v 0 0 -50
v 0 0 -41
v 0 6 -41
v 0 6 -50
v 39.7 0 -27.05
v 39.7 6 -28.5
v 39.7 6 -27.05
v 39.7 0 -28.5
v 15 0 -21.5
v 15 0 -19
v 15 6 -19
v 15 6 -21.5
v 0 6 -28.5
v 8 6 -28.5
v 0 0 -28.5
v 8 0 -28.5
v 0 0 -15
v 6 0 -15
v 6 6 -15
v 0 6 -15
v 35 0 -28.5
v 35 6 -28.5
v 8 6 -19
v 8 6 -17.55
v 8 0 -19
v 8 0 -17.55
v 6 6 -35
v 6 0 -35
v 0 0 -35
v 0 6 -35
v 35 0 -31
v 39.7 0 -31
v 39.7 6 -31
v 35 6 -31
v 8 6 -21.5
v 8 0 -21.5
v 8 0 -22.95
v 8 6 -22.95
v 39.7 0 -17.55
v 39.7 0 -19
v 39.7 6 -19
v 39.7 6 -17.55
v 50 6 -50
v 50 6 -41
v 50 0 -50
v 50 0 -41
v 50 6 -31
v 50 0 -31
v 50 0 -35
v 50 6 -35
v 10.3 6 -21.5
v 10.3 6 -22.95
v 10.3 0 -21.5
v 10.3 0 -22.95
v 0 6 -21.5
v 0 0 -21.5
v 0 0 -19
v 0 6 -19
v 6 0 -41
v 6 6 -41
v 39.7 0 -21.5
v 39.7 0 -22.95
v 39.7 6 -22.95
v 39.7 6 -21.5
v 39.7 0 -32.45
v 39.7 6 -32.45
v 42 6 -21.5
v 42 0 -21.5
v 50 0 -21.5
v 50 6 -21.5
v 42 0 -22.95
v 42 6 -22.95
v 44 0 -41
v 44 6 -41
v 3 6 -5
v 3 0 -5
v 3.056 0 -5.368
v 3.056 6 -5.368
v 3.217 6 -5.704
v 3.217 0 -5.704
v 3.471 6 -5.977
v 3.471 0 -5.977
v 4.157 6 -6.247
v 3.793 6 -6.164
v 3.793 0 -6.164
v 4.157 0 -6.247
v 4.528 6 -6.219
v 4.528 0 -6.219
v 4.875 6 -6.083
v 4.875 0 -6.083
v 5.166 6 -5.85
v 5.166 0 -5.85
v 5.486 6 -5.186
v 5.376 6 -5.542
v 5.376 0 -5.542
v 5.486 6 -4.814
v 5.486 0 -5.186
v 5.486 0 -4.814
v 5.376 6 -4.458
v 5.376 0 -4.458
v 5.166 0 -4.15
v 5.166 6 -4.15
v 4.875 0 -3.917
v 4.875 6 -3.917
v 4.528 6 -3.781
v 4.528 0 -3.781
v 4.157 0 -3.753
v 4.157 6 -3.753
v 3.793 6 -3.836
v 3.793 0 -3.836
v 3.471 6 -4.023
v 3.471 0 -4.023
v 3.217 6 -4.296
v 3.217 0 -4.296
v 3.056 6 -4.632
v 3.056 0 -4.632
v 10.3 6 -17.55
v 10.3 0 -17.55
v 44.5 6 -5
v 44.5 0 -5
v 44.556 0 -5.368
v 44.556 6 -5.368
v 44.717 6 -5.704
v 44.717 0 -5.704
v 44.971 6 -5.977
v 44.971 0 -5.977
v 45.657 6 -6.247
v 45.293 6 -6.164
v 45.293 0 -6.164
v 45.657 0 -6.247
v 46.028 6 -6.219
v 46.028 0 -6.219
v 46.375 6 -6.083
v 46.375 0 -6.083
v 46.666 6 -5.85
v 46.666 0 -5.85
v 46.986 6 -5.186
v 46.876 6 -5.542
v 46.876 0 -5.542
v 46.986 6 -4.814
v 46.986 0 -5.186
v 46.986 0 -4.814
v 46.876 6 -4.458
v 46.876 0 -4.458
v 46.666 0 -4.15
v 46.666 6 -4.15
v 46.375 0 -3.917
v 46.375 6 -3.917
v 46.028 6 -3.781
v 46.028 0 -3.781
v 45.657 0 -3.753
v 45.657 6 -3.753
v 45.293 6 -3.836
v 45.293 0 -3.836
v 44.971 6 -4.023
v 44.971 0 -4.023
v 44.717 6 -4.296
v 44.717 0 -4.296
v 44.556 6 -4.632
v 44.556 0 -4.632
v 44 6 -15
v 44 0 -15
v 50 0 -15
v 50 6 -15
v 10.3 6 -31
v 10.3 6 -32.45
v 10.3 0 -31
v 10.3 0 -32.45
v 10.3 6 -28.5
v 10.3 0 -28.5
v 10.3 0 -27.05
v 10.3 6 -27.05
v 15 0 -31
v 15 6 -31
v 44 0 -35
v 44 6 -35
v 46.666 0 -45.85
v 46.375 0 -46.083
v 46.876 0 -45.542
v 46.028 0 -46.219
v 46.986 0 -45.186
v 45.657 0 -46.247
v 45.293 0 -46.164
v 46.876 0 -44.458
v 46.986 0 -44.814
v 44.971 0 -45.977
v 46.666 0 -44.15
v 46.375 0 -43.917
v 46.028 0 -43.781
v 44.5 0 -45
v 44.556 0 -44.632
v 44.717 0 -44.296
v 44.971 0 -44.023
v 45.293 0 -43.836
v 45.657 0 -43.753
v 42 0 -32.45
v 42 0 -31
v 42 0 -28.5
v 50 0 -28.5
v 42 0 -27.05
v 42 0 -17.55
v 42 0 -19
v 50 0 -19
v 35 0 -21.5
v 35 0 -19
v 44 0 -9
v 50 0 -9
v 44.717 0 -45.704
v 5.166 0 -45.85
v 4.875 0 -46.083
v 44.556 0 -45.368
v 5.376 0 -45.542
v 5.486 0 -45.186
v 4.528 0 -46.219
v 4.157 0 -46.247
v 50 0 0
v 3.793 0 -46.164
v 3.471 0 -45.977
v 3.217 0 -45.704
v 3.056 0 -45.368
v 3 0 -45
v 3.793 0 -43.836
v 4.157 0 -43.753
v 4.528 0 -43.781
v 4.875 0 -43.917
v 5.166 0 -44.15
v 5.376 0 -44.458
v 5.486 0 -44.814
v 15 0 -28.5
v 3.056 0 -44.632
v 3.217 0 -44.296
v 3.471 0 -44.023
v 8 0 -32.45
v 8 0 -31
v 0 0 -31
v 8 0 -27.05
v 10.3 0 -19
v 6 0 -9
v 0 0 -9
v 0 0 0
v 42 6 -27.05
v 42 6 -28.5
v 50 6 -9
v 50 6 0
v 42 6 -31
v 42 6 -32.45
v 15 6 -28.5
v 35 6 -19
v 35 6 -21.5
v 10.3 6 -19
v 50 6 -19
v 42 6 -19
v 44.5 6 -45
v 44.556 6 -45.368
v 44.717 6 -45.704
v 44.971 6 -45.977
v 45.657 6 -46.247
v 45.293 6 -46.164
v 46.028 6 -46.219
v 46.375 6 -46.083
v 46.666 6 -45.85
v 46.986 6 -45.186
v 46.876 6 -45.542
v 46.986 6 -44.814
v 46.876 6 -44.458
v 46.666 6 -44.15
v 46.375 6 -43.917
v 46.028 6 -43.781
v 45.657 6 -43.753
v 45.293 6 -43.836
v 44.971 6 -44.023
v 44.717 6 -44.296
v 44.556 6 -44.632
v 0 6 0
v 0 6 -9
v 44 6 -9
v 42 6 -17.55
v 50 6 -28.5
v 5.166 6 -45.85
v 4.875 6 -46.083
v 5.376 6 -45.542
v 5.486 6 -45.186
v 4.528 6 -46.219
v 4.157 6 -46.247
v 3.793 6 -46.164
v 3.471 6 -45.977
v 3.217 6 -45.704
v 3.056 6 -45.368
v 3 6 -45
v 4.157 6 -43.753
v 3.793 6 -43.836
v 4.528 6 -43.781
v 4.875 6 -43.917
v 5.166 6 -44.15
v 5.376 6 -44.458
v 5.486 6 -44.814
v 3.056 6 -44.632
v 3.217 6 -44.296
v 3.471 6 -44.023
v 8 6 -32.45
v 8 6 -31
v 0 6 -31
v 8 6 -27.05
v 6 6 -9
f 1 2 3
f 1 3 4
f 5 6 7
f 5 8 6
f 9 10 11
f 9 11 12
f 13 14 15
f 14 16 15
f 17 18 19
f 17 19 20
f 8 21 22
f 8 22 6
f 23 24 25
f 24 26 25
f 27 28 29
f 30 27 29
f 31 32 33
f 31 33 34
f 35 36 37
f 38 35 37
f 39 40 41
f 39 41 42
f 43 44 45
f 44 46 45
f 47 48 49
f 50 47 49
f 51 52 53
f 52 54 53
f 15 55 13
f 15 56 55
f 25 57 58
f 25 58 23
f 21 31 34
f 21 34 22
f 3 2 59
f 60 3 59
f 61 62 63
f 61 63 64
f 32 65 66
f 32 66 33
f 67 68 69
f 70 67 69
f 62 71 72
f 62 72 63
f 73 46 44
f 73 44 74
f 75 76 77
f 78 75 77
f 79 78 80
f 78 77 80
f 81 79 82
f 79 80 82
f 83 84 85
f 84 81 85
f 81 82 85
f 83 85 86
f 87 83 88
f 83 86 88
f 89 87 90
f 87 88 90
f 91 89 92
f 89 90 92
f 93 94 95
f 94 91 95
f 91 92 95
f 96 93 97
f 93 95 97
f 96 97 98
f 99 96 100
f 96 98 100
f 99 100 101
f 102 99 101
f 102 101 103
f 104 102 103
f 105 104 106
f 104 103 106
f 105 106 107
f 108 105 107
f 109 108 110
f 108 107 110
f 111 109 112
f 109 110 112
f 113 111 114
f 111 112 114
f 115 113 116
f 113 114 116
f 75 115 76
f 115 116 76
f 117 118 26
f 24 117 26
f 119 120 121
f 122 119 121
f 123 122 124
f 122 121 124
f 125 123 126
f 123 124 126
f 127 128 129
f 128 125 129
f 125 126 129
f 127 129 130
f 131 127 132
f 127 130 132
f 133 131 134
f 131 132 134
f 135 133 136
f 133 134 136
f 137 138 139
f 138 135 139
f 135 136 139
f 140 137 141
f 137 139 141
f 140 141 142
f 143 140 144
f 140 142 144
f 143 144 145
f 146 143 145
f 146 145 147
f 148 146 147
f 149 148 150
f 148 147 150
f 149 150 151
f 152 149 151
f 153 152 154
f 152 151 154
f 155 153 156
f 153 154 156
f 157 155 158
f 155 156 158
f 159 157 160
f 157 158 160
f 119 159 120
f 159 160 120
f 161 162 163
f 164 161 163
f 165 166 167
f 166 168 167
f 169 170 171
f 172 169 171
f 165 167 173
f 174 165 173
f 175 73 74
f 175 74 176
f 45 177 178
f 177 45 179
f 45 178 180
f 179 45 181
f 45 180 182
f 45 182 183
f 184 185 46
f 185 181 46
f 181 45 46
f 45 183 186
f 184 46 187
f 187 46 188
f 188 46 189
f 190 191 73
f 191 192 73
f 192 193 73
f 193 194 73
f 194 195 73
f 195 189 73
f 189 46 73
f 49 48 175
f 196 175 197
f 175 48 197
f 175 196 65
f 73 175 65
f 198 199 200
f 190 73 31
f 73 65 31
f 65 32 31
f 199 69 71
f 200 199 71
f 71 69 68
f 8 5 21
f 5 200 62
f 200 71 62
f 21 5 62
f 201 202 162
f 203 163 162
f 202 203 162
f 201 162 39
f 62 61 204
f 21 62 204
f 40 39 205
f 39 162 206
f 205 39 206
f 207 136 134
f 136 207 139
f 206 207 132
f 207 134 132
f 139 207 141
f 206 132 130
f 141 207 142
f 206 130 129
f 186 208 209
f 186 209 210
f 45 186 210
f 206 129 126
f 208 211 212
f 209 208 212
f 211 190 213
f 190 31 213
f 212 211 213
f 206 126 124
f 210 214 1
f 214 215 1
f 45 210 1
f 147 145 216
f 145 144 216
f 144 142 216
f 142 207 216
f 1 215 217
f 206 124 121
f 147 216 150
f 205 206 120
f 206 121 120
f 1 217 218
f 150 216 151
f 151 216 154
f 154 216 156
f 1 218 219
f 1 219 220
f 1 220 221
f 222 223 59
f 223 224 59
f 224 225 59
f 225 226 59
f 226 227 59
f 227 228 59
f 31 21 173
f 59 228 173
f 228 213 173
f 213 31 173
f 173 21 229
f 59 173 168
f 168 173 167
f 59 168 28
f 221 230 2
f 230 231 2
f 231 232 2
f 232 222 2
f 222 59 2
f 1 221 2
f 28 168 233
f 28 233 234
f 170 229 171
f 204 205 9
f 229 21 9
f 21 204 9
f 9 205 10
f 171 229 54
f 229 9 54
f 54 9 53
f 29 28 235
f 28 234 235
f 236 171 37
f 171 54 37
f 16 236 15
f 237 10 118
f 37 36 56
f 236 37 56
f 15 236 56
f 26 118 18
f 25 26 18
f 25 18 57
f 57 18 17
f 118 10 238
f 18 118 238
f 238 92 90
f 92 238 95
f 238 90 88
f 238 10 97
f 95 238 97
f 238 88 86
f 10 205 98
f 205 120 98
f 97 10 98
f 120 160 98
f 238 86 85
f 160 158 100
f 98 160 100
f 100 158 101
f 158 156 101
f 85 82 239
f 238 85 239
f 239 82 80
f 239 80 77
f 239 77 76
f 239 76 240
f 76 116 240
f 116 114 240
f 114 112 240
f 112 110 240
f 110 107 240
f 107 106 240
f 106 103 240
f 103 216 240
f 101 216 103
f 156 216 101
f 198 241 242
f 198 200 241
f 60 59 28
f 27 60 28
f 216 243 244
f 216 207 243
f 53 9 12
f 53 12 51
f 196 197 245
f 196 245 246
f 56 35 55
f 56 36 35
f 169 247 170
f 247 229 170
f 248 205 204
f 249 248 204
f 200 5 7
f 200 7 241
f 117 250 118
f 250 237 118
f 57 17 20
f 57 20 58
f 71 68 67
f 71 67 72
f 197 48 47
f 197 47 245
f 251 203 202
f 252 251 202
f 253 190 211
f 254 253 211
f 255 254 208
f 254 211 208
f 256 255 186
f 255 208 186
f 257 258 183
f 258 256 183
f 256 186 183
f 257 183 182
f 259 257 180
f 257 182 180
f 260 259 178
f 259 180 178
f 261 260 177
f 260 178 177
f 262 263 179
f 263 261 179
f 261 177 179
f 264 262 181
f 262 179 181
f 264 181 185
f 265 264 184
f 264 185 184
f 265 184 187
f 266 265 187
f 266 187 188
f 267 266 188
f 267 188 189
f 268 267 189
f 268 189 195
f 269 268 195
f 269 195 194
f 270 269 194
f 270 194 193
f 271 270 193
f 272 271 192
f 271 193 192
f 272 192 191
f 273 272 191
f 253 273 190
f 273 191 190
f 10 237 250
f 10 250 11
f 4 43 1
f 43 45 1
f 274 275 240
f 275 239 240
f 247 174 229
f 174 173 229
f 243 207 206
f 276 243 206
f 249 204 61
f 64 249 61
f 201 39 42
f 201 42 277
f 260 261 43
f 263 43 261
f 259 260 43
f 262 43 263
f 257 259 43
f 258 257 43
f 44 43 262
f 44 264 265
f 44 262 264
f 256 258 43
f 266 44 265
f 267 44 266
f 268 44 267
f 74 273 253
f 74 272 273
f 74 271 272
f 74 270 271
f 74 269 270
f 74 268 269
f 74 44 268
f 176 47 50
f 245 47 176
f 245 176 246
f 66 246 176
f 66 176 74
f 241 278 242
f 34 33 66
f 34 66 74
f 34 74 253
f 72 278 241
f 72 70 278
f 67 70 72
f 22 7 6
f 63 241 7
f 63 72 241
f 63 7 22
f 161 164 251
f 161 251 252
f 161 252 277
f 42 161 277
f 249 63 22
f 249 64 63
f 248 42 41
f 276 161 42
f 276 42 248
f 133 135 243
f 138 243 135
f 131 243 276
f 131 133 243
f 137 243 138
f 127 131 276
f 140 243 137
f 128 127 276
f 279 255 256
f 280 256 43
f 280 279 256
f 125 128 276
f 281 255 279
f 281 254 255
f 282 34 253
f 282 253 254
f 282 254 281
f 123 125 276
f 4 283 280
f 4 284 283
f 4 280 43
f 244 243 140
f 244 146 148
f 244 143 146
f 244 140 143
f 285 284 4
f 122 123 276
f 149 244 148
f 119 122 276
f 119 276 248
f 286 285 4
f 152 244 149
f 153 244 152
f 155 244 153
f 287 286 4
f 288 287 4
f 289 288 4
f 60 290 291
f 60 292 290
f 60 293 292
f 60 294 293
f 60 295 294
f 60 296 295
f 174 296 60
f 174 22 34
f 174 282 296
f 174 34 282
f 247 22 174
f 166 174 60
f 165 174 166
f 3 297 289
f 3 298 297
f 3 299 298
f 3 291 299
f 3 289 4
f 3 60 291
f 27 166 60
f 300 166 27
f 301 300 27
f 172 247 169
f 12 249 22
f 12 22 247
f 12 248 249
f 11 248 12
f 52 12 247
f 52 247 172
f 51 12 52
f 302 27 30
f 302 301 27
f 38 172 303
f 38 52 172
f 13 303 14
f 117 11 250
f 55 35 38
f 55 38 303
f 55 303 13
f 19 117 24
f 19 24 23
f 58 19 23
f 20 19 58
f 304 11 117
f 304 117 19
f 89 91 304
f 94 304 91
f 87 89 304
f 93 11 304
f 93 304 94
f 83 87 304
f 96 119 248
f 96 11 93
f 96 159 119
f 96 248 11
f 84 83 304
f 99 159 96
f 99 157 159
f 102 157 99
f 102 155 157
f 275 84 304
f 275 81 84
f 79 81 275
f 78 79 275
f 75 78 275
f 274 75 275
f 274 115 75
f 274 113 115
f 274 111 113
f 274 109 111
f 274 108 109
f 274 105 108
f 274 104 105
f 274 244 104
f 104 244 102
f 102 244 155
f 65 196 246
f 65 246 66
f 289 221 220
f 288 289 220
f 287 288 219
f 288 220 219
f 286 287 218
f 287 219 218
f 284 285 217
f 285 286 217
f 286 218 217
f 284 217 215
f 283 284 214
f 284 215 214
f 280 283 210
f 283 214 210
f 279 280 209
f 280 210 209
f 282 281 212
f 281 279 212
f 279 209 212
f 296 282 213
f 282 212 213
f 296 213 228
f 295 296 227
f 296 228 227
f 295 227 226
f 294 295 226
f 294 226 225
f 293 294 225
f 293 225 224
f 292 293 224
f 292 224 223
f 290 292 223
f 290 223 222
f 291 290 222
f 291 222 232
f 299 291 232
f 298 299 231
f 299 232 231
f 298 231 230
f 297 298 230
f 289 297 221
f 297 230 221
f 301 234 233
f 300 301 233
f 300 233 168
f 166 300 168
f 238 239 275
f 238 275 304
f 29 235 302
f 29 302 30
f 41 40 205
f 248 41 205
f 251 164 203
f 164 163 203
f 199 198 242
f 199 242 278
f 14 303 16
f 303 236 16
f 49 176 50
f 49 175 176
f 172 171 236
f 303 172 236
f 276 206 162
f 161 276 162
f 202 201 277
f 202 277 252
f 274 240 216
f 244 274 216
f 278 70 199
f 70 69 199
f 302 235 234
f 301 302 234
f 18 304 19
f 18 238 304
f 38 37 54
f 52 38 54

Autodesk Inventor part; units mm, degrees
ref_plane "YZ Plane" through (0, 0, 0) normal (1, 0, 0) x (0, 1, 0)
ref_plane "XZ Plane" through (0, 0, 0) normal (0, 1, 0) x (-1, 0, 0)
ref_plane "XY Plane" through (0, 0, 0) normal (0, 0, 1) x (1, 0, 0)
sketch "Sketch1" plane through (0, 0, 0) normal (0, 1, 0) x (-1, 0, 0)
  line L0 (0, 0) -> (-50, 0)
  line L1 (-50, -50) -> (0, -50)
  line L2 (-50, -41) -> (-44, -41)
  line L3 (-44, -41) -> (-44, -35)
  line L4 (-44, -35) -> (-50, -35)
  line L5 (-50, -35) -> (-50, -41) construction
  line L6 (-50, -9) -> (-44, -9)
  line L7 (-44, -9) -> (-44, -15)
  line L8 (-44, -15) -> (-50, -15)
  line L9 (-50, -15) -> (-50, -9) construction
  line L10 (-25, 0) -> (-25, -50) construction
  line L11 (-50, -9) -> (-50, 0)
  line L12 (-50, -15) -> (-50, -19)
  line L13 (-50, -41) -> (-50, -50)
  circle A0 centre (-45.75, -5) radius 1.25
  circle A1 centre (-45.75, -45) radius 1.25
  line L14 (-50, -31) -> (-42, -31)
  line L15 (-35, -31) -> (-35, -28.5)
  line L16 (-35, -28.5) -> (-39.7, -28.5)
  line L17 (-50, -19) -> (-42, -19)
  line L18 (-35, -19) -> (-35, -21.5)
  line L19 (-35, -21.5) -> (-39.7, -21.5)
  line L20 (-50, -31) -> (-50, -35)
  line L21 (-50, -28.5) -> (-50, -31) construction
  line L22 (-50, -21.5) -> (-50, -28.5)
  line L23 (-50, -19) -> (-50, -21.5) construction
  line L24 (-42, -32.45) -> (-39.7, -32.45)
  line L25 (-39.7, -32.45) -> (-39.7, -31)
  line L26 (-39.7, -27.05) -> (-42, -27.05)
  line L27 (-42, -27.05) -> (-42, -28.5)
  line L28 (-42, -31) -> (-42, -32.45)
  line L29 (-42, -28.5) -> (-42, -31) construction
  line L30 (-42, -22.95) -> (-39.7, -22.95)
  line L31 (-39.7, -22.95) -> (-39.7, -21.5)
  line L32 (-39.7, -17.55) -> (-42, -17.55)
  line L33 (-42, -17.55) -> (-42, -19)
  line L34 (-42, -21.5) -> (-42, -22.95)
  line L35 (-42, -19) -> (-42, -21.5) construction
  line L36 (-39.7, -28.5) -> (-39.7, -27.05)
  line L37 (-39.7, -31) -> (-39.7, -28.5) construction
  line L38 (-39.7, -21.5) -> (-39.7, -19) construction
  line L39 (-39.7, -19) -> (-39.7, -17.55)
  line L40 (-42, -31) -> (-39.7, -31) construction
  line L41 (-39.7, -31) -> (-35, -31)
  line L42 (-42, -28.5) -> (-50, -28.5)
  line L43 (-39.7, -28.5) -> (-42, -28.5) construction
  line L44 (-42, -21.5) -> (-50, -21.5)
  line L45 (-39.7, -21.5) -> (-42, -21.5) construction
  line L46 (-42, -19) -> (-39.7, -19) construction
  line L47 (-39.7, -19) -> (-35, -19)
  line L48 (0, -41) -> (-6, -41)
  line L49 (-6, -41) -> (-6, -35)
  line L50 (-6, -35) -> (0, -35)
  line L51 (0, -35) -> (0, -41) construction
  line L52 (0, -9) -> (-6, -9)
  line L53 (-6, -9) -> (-6, -15)
  line L54 (-6, -15) -> (0, -15)
  line L55 (0, -15) -> (0, -9) construction
  line L56 (0, -9) -> (0, 0)
  line L57 (0, -15) -> (0, -19)
  line L58 (0, -41) -> (0, -50)
  circle A2 centre (-4.25, -5) radius 1.25
  circle A3 centre (-4.25, -45) radius 1.25
  line L59 (0, -31) -> (-8, -31)
  line L60 (-15, -31) -> (-15, -28.5)
  line L61 (-15, -28.5) -> (-10.3, -28.5)
  line L62 (0, -19) -> (-8, -19)
  line L63 (-15, -19) -> (-15, -21.5)
  line L64 (-15, -21.5) -> (-10.3, -21.5)
  line L65 (0, -31) -> (0, -35)
  line L66 (0, -28.5) -> (0, -31) construction
  line L67 (0, -21.5) -> (0, -28.5)
  line L68 (0, -19) -> (0, -21.5) construction
  line L69 (-8, -32.45) -> (-10.3, -32.45)
  line L70 (-10.3, -32.45) -> (-10.3, -31)
  line L71 (-10.3, -27.05) -> (-8, -27.05)
  line L72 (-8, -27.05) -> (-8, -28.5)
  line L73 (-8, -31) -> (-8, -32.45)
  line L74 (-8, -28.5) -> (-8, -31) construction
  line L75 (-8, -22.95) -> (-10.3, -22.95)
  line L76 (-10.3, -22.95) -> (-10.3, -21.5)
  line L77 (-10.3, -17.55) -> (-8, -17.55)
  line L78 (-8, -17.55) -> (-8, -19)
  line L79 (-8, -21.5) -> (-8, -22.95)
  line L80 (-8, -19) -> (-8, -21.5) construction
  line L81 (-10.3, -28.5) -> (-10.3, -27.05)
  line L82 (-10.3, -31) -> (-10.3, -28.5) construction
  line L83 (-10.3, -21.5) -> (-10.3, -19) construction
  line L84 (-10.3, -19) -> (-10.3, -17.55)
  line L85 (-8, -31) -> (-10.3, -31) construction
  line L86 (-10.3, -31) -> (-15, -31)
  line L87 (-8, -28.5) -> (0, -28.5)
  line L88 (-10.3, -28.5) -> (-8, -28.5) construction
  line L89 (-8, -21.5) -> (0, -21.5)
  line L90 (-10.3, -21.5) -> (-8, -21.5) construction
  line L91 (-8, -19) -> (-10.3, -19) construction
  line L92 (-10.3, -19) -> (-15, -19)
  dimension "d0" = 50
  dimension "d1" = 50
  dimension "d20" = 6
  dimension "d21" = 6
  dimension "d22" = 6
  dimension "d26" = 20
  dimension "d27" = 2.5
  dimension "d28" = 4.25
  dimension "d30" = 2.5
  dimension "d31" = 4.25
  dimension "d32" = 4
  dimension "d33" = 15
  dimension "d34" = 2.5
  dimension "d35" = 15
  dimension "d36" = 2.5
  dimension "d37" = 4
  dimension "d38" = 5.4
  dimension "d39" = 2.3
  dimension "d40" = 8
  dimension "d41" = 2.3
  dimension "d42" = 5.4
  dimension "d43" = 8
  dimension "d44" = 4
extrude "Extrusion2" add sketch "Sketch1" along normal blind 6
equation "\"d22\" = d21"
equation "\"d30\" = d27"
equation "\"d31\" = d28"
equation "\"d32\" = d44"
equation "\"d33\" = d35"
equation "\"d34\" = d27"
equation "\"d36\" = d27"
equation "\"d43\" = d40"
properties part number "wall-front"
